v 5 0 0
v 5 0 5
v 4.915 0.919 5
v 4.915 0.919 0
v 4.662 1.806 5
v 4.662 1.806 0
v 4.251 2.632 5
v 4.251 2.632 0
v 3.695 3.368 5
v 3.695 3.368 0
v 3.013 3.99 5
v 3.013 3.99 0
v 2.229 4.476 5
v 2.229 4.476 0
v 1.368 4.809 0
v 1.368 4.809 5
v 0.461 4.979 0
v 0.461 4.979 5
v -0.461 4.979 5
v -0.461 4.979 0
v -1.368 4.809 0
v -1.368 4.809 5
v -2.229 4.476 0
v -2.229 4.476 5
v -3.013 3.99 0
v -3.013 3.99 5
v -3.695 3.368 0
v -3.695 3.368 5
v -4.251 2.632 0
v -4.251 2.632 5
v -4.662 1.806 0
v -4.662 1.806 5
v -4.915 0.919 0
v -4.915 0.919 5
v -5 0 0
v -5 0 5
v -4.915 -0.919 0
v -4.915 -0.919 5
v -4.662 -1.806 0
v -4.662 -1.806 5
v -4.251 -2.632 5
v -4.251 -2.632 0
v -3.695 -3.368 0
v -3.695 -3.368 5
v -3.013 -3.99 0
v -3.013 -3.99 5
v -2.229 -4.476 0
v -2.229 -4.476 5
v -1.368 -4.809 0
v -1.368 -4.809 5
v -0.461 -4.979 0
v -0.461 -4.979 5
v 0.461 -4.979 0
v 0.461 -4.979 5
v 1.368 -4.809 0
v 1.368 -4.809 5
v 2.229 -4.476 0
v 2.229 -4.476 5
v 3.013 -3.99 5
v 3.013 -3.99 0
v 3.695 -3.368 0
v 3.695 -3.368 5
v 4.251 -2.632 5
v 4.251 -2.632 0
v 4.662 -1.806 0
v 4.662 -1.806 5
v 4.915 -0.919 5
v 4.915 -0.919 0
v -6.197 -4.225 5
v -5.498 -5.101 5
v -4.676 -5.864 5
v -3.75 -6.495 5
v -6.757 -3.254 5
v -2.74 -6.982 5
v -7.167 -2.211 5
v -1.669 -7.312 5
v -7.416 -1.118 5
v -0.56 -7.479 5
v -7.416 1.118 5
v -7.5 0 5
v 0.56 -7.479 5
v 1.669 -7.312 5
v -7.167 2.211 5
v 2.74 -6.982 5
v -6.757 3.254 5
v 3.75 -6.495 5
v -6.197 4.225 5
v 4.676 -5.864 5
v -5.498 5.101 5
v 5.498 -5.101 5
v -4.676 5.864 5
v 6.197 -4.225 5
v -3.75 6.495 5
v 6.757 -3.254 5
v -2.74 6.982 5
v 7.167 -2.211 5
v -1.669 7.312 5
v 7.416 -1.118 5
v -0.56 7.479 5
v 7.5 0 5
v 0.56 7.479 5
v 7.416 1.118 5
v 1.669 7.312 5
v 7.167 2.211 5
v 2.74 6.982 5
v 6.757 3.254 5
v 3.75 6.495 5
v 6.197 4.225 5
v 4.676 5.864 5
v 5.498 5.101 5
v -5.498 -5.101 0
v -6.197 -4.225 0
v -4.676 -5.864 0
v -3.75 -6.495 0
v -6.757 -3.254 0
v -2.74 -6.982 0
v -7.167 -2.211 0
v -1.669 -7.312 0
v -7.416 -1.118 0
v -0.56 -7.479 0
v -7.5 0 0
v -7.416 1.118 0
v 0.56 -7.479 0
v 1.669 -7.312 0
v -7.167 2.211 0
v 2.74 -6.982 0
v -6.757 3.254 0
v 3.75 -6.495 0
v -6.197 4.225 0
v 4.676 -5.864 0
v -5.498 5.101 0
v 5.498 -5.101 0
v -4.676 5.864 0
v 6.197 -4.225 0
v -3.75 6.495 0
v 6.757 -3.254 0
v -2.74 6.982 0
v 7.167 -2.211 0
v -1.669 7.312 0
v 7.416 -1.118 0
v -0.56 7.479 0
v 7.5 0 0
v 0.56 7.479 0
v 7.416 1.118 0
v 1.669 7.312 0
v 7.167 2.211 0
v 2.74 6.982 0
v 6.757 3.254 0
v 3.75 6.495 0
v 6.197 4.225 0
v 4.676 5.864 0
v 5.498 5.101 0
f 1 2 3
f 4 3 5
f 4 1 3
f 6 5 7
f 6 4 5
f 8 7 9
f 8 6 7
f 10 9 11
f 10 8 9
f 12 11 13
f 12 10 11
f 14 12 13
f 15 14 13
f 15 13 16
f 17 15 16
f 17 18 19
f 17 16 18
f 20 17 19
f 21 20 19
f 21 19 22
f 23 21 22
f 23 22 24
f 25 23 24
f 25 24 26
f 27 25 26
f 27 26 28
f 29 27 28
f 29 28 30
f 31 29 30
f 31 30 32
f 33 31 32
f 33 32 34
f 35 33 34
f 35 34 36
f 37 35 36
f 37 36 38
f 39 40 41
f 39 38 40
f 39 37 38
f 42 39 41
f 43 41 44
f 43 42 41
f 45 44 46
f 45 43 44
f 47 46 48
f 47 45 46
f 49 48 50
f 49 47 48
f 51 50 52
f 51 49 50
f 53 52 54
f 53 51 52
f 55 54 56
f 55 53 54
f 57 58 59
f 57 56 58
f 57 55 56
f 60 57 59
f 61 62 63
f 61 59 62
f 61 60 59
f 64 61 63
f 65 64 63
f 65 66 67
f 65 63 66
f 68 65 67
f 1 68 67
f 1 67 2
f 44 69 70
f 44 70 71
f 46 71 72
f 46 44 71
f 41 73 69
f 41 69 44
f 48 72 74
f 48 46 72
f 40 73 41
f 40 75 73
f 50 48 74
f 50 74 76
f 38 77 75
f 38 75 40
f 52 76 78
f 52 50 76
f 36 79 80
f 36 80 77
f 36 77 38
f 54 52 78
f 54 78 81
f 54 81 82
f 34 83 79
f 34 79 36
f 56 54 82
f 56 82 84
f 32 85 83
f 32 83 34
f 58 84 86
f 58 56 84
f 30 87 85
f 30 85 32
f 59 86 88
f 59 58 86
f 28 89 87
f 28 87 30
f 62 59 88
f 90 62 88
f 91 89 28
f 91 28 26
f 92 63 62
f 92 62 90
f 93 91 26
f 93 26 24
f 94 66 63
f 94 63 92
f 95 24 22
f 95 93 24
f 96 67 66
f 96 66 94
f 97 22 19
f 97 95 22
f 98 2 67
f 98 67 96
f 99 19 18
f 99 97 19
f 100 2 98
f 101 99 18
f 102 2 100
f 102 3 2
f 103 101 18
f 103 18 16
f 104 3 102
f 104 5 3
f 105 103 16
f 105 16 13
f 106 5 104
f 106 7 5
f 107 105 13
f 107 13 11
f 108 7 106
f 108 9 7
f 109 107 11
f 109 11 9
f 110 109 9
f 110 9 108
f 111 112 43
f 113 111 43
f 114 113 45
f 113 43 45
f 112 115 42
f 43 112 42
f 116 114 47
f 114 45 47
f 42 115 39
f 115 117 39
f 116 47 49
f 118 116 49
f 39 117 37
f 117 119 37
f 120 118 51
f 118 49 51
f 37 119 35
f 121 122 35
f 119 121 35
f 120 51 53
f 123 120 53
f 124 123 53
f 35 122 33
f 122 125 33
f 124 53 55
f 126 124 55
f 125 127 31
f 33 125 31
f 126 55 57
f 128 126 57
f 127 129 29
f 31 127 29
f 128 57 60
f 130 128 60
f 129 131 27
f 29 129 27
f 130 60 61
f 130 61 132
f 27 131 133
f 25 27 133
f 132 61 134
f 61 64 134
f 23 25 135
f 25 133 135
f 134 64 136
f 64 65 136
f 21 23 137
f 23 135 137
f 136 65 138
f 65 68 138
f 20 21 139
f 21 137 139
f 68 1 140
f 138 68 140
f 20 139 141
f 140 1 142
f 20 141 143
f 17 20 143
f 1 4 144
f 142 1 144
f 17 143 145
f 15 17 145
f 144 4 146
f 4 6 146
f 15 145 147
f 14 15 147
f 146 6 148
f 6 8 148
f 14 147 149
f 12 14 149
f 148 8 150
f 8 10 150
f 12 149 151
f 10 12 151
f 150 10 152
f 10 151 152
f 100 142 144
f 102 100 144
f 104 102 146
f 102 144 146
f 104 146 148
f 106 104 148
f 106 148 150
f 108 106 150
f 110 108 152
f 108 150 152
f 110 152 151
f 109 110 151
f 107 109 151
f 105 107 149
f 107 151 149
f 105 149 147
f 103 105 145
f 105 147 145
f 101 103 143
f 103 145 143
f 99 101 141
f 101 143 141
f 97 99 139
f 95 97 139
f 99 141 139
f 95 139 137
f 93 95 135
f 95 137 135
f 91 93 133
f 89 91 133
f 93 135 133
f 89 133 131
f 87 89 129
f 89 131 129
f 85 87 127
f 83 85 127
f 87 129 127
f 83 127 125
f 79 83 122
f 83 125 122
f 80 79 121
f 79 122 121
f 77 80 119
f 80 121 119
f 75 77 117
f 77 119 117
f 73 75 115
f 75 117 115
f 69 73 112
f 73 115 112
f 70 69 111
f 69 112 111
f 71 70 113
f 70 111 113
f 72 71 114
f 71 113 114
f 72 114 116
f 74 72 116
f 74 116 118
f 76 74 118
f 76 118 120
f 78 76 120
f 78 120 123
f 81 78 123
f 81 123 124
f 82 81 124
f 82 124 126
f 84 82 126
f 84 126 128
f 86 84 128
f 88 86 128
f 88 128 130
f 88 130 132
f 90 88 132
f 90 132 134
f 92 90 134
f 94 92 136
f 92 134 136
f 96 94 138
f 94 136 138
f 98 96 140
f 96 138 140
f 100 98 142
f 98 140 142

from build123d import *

# Parameters (mm, degrees)
CYLINDER048_R     = 5
CYLINDER048_DEPTH = 10
CYLINDER049_R     = 7.5
CYLINDER049_DEPTH = 5


with BuildPart() as cylinder048:
    # Cylinder048 → Cylinder048 (new body)
    with BuildSketch(Plane.XY):
        Circle(CYLINDER048_R)
    extrude(amount=CYLINDER048_DEPTH)


with BuildPart() as autoblocantem10:
    # Cylinder049 → Cylinder049 (new body)
    with BuildSketch(Plane.XY):
        Circle(CYLINDER049_R)
    extrude(amount=CYLINDER049_DEPTH)

    # Cut004037: cut Cylinder048
    add(cylinder048.part, mode=Mode.SUBTRACT)


solid = autoblocantem10.part
